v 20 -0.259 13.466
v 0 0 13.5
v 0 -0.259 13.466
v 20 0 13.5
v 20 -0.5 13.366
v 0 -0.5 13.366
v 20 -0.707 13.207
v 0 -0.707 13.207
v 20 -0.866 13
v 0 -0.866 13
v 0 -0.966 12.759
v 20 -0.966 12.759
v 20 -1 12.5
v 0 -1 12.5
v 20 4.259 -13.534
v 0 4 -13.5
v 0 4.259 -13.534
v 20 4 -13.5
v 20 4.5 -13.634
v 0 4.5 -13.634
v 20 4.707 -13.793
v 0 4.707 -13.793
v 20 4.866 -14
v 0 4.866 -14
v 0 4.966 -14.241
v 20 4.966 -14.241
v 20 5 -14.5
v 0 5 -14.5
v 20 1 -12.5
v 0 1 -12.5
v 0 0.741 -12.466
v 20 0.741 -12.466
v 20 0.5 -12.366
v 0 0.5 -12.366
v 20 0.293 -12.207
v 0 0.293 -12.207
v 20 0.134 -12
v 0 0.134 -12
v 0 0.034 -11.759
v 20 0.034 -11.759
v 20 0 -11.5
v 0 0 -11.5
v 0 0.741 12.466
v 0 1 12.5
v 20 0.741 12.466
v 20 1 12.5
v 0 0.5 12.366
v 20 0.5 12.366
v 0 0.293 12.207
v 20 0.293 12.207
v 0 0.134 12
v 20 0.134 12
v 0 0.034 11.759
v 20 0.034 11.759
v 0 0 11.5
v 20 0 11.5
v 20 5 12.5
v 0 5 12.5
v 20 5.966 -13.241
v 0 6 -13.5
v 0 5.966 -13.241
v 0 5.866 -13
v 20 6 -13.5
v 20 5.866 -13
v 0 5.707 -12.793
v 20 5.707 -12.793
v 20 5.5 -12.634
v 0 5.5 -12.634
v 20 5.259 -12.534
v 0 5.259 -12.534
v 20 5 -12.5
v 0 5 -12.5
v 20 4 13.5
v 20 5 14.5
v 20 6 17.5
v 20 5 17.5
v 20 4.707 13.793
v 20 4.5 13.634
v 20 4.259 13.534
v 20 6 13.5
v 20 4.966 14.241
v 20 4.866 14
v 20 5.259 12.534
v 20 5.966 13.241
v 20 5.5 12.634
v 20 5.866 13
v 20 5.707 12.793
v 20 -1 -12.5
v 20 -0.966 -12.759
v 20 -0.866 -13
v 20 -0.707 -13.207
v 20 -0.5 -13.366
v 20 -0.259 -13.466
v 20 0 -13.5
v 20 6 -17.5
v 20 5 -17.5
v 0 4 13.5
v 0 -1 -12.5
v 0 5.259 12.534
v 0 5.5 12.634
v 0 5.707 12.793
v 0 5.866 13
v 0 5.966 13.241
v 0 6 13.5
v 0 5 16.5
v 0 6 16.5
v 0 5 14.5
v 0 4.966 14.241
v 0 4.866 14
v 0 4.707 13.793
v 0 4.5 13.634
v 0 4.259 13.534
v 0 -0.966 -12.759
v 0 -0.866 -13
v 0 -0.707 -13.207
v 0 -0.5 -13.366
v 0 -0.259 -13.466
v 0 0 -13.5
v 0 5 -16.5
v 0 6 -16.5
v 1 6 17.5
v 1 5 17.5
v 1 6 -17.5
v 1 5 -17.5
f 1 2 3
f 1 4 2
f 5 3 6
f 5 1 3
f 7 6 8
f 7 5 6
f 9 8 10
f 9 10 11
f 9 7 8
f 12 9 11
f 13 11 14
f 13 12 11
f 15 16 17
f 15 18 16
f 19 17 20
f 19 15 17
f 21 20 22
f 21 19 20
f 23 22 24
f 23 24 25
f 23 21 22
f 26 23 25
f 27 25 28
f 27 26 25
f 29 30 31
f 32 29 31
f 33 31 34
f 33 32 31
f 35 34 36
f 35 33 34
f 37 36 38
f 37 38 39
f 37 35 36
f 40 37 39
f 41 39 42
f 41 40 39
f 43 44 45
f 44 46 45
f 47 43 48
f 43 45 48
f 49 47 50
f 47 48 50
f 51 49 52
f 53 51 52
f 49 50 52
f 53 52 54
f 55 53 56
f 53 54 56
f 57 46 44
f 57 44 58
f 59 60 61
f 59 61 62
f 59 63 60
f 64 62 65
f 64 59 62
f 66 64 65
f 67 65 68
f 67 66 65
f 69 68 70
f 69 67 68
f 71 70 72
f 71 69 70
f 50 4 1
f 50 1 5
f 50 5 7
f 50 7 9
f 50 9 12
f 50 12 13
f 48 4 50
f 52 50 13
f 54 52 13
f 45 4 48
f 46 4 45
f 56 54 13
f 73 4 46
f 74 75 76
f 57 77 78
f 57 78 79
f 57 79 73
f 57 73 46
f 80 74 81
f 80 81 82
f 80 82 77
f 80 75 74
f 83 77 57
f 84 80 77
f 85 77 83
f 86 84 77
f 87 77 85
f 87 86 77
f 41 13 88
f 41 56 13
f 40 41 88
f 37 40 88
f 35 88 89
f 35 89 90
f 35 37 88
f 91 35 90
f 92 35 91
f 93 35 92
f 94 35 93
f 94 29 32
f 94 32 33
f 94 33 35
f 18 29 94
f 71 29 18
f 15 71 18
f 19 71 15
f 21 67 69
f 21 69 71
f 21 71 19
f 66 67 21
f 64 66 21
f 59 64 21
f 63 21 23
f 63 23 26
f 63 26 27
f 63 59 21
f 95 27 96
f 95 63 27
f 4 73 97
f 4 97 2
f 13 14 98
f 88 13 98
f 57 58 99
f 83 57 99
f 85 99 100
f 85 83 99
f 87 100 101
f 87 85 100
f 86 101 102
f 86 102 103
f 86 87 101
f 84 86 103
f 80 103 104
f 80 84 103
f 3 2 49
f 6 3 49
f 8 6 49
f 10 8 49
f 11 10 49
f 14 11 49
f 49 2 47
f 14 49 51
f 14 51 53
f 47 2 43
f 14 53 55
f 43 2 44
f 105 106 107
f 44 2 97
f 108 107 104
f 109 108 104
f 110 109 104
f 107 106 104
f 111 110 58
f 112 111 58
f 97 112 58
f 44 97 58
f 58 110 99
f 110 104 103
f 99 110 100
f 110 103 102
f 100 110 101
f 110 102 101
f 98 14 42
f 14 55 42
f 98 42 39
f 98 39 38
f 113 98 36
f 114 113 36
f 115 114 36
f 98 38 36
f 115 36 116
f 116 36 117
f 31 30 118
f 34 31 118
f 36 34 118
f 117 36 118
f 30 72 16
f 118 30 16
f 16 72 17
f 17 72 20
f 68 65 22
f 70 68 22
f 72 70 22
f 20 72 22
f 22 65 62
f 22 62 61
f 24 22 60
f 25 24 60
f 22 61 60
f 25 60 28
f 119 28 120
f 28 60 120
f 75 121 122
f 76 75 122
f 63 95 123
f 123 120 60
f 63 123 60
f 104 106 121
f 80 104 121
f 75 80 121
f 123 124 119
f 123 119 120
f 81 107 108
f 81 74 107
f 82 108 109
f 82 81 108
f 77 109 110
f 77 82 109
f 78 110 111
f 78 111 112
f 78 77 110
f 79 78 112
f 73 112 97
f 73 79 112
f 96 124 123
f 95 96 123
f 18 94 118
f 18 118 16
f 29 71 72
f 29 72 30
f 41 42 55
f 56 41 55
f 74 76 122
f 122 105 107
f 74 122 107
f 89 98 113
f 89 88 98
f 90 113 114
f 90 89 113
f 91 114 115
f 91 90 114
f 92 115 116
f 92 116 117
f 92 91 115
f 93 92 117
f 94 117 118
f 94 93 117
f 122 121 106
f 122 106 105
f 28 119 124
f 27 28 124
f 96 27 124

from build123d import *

# Parameters (mm, degrees)
EXTRUDE_1_DEPTH = 20
FILLET_1_R      = 1
CHAMFER_1_SIZE  = 1


with BuildPart() as part:
    # 草图1 → 凸台-拉伸1 (new body)
    with BuildSketch(Plane(origin=(0, 0, 0), x_dir=(0, 0, -1), z_dir=(1, 0, 0))):
        Polygon((0, 0), (-12.5, 0), (-12.5, 6), (-17.5, 6), (-17.5, 5), (-13.5, 5), (-13.5, -1), (0, -1), (13.5, -1), (13.5, 5), (17.5, 5), (17.5, 6), (12.5, 6), (12.5, 0), align=None)
    extrude(amount=EXTRUDE_1_DEPTH)

    # 圆角1
    fillet_1_edges = [part.edges().sort_by_distance(p)[0] for p in [
        (10, -1, -13.5),
        (10, -1, 13.5),
        (10, 5, 13.5),
        (10, 6, 12.5),
        (10, 0, 12.5),
        (10, 0, -12.5),
        (10, 6, -12.5),
        (10, 5, -13.5),
    ]]
    fillet(fillet_1_edges, radius=FILLET_1_R)

    # 倒角1
    chamfer_1_edges = [part.edges().sort_by_distance(p)[0] for p in [
        (0, 5.5, 17.5),
        (0, 5.5, -17.5),
    ]]
    chamfer(chamfer_1_edges, length=CHAMFER_1_SIZE)


solid = part.part
